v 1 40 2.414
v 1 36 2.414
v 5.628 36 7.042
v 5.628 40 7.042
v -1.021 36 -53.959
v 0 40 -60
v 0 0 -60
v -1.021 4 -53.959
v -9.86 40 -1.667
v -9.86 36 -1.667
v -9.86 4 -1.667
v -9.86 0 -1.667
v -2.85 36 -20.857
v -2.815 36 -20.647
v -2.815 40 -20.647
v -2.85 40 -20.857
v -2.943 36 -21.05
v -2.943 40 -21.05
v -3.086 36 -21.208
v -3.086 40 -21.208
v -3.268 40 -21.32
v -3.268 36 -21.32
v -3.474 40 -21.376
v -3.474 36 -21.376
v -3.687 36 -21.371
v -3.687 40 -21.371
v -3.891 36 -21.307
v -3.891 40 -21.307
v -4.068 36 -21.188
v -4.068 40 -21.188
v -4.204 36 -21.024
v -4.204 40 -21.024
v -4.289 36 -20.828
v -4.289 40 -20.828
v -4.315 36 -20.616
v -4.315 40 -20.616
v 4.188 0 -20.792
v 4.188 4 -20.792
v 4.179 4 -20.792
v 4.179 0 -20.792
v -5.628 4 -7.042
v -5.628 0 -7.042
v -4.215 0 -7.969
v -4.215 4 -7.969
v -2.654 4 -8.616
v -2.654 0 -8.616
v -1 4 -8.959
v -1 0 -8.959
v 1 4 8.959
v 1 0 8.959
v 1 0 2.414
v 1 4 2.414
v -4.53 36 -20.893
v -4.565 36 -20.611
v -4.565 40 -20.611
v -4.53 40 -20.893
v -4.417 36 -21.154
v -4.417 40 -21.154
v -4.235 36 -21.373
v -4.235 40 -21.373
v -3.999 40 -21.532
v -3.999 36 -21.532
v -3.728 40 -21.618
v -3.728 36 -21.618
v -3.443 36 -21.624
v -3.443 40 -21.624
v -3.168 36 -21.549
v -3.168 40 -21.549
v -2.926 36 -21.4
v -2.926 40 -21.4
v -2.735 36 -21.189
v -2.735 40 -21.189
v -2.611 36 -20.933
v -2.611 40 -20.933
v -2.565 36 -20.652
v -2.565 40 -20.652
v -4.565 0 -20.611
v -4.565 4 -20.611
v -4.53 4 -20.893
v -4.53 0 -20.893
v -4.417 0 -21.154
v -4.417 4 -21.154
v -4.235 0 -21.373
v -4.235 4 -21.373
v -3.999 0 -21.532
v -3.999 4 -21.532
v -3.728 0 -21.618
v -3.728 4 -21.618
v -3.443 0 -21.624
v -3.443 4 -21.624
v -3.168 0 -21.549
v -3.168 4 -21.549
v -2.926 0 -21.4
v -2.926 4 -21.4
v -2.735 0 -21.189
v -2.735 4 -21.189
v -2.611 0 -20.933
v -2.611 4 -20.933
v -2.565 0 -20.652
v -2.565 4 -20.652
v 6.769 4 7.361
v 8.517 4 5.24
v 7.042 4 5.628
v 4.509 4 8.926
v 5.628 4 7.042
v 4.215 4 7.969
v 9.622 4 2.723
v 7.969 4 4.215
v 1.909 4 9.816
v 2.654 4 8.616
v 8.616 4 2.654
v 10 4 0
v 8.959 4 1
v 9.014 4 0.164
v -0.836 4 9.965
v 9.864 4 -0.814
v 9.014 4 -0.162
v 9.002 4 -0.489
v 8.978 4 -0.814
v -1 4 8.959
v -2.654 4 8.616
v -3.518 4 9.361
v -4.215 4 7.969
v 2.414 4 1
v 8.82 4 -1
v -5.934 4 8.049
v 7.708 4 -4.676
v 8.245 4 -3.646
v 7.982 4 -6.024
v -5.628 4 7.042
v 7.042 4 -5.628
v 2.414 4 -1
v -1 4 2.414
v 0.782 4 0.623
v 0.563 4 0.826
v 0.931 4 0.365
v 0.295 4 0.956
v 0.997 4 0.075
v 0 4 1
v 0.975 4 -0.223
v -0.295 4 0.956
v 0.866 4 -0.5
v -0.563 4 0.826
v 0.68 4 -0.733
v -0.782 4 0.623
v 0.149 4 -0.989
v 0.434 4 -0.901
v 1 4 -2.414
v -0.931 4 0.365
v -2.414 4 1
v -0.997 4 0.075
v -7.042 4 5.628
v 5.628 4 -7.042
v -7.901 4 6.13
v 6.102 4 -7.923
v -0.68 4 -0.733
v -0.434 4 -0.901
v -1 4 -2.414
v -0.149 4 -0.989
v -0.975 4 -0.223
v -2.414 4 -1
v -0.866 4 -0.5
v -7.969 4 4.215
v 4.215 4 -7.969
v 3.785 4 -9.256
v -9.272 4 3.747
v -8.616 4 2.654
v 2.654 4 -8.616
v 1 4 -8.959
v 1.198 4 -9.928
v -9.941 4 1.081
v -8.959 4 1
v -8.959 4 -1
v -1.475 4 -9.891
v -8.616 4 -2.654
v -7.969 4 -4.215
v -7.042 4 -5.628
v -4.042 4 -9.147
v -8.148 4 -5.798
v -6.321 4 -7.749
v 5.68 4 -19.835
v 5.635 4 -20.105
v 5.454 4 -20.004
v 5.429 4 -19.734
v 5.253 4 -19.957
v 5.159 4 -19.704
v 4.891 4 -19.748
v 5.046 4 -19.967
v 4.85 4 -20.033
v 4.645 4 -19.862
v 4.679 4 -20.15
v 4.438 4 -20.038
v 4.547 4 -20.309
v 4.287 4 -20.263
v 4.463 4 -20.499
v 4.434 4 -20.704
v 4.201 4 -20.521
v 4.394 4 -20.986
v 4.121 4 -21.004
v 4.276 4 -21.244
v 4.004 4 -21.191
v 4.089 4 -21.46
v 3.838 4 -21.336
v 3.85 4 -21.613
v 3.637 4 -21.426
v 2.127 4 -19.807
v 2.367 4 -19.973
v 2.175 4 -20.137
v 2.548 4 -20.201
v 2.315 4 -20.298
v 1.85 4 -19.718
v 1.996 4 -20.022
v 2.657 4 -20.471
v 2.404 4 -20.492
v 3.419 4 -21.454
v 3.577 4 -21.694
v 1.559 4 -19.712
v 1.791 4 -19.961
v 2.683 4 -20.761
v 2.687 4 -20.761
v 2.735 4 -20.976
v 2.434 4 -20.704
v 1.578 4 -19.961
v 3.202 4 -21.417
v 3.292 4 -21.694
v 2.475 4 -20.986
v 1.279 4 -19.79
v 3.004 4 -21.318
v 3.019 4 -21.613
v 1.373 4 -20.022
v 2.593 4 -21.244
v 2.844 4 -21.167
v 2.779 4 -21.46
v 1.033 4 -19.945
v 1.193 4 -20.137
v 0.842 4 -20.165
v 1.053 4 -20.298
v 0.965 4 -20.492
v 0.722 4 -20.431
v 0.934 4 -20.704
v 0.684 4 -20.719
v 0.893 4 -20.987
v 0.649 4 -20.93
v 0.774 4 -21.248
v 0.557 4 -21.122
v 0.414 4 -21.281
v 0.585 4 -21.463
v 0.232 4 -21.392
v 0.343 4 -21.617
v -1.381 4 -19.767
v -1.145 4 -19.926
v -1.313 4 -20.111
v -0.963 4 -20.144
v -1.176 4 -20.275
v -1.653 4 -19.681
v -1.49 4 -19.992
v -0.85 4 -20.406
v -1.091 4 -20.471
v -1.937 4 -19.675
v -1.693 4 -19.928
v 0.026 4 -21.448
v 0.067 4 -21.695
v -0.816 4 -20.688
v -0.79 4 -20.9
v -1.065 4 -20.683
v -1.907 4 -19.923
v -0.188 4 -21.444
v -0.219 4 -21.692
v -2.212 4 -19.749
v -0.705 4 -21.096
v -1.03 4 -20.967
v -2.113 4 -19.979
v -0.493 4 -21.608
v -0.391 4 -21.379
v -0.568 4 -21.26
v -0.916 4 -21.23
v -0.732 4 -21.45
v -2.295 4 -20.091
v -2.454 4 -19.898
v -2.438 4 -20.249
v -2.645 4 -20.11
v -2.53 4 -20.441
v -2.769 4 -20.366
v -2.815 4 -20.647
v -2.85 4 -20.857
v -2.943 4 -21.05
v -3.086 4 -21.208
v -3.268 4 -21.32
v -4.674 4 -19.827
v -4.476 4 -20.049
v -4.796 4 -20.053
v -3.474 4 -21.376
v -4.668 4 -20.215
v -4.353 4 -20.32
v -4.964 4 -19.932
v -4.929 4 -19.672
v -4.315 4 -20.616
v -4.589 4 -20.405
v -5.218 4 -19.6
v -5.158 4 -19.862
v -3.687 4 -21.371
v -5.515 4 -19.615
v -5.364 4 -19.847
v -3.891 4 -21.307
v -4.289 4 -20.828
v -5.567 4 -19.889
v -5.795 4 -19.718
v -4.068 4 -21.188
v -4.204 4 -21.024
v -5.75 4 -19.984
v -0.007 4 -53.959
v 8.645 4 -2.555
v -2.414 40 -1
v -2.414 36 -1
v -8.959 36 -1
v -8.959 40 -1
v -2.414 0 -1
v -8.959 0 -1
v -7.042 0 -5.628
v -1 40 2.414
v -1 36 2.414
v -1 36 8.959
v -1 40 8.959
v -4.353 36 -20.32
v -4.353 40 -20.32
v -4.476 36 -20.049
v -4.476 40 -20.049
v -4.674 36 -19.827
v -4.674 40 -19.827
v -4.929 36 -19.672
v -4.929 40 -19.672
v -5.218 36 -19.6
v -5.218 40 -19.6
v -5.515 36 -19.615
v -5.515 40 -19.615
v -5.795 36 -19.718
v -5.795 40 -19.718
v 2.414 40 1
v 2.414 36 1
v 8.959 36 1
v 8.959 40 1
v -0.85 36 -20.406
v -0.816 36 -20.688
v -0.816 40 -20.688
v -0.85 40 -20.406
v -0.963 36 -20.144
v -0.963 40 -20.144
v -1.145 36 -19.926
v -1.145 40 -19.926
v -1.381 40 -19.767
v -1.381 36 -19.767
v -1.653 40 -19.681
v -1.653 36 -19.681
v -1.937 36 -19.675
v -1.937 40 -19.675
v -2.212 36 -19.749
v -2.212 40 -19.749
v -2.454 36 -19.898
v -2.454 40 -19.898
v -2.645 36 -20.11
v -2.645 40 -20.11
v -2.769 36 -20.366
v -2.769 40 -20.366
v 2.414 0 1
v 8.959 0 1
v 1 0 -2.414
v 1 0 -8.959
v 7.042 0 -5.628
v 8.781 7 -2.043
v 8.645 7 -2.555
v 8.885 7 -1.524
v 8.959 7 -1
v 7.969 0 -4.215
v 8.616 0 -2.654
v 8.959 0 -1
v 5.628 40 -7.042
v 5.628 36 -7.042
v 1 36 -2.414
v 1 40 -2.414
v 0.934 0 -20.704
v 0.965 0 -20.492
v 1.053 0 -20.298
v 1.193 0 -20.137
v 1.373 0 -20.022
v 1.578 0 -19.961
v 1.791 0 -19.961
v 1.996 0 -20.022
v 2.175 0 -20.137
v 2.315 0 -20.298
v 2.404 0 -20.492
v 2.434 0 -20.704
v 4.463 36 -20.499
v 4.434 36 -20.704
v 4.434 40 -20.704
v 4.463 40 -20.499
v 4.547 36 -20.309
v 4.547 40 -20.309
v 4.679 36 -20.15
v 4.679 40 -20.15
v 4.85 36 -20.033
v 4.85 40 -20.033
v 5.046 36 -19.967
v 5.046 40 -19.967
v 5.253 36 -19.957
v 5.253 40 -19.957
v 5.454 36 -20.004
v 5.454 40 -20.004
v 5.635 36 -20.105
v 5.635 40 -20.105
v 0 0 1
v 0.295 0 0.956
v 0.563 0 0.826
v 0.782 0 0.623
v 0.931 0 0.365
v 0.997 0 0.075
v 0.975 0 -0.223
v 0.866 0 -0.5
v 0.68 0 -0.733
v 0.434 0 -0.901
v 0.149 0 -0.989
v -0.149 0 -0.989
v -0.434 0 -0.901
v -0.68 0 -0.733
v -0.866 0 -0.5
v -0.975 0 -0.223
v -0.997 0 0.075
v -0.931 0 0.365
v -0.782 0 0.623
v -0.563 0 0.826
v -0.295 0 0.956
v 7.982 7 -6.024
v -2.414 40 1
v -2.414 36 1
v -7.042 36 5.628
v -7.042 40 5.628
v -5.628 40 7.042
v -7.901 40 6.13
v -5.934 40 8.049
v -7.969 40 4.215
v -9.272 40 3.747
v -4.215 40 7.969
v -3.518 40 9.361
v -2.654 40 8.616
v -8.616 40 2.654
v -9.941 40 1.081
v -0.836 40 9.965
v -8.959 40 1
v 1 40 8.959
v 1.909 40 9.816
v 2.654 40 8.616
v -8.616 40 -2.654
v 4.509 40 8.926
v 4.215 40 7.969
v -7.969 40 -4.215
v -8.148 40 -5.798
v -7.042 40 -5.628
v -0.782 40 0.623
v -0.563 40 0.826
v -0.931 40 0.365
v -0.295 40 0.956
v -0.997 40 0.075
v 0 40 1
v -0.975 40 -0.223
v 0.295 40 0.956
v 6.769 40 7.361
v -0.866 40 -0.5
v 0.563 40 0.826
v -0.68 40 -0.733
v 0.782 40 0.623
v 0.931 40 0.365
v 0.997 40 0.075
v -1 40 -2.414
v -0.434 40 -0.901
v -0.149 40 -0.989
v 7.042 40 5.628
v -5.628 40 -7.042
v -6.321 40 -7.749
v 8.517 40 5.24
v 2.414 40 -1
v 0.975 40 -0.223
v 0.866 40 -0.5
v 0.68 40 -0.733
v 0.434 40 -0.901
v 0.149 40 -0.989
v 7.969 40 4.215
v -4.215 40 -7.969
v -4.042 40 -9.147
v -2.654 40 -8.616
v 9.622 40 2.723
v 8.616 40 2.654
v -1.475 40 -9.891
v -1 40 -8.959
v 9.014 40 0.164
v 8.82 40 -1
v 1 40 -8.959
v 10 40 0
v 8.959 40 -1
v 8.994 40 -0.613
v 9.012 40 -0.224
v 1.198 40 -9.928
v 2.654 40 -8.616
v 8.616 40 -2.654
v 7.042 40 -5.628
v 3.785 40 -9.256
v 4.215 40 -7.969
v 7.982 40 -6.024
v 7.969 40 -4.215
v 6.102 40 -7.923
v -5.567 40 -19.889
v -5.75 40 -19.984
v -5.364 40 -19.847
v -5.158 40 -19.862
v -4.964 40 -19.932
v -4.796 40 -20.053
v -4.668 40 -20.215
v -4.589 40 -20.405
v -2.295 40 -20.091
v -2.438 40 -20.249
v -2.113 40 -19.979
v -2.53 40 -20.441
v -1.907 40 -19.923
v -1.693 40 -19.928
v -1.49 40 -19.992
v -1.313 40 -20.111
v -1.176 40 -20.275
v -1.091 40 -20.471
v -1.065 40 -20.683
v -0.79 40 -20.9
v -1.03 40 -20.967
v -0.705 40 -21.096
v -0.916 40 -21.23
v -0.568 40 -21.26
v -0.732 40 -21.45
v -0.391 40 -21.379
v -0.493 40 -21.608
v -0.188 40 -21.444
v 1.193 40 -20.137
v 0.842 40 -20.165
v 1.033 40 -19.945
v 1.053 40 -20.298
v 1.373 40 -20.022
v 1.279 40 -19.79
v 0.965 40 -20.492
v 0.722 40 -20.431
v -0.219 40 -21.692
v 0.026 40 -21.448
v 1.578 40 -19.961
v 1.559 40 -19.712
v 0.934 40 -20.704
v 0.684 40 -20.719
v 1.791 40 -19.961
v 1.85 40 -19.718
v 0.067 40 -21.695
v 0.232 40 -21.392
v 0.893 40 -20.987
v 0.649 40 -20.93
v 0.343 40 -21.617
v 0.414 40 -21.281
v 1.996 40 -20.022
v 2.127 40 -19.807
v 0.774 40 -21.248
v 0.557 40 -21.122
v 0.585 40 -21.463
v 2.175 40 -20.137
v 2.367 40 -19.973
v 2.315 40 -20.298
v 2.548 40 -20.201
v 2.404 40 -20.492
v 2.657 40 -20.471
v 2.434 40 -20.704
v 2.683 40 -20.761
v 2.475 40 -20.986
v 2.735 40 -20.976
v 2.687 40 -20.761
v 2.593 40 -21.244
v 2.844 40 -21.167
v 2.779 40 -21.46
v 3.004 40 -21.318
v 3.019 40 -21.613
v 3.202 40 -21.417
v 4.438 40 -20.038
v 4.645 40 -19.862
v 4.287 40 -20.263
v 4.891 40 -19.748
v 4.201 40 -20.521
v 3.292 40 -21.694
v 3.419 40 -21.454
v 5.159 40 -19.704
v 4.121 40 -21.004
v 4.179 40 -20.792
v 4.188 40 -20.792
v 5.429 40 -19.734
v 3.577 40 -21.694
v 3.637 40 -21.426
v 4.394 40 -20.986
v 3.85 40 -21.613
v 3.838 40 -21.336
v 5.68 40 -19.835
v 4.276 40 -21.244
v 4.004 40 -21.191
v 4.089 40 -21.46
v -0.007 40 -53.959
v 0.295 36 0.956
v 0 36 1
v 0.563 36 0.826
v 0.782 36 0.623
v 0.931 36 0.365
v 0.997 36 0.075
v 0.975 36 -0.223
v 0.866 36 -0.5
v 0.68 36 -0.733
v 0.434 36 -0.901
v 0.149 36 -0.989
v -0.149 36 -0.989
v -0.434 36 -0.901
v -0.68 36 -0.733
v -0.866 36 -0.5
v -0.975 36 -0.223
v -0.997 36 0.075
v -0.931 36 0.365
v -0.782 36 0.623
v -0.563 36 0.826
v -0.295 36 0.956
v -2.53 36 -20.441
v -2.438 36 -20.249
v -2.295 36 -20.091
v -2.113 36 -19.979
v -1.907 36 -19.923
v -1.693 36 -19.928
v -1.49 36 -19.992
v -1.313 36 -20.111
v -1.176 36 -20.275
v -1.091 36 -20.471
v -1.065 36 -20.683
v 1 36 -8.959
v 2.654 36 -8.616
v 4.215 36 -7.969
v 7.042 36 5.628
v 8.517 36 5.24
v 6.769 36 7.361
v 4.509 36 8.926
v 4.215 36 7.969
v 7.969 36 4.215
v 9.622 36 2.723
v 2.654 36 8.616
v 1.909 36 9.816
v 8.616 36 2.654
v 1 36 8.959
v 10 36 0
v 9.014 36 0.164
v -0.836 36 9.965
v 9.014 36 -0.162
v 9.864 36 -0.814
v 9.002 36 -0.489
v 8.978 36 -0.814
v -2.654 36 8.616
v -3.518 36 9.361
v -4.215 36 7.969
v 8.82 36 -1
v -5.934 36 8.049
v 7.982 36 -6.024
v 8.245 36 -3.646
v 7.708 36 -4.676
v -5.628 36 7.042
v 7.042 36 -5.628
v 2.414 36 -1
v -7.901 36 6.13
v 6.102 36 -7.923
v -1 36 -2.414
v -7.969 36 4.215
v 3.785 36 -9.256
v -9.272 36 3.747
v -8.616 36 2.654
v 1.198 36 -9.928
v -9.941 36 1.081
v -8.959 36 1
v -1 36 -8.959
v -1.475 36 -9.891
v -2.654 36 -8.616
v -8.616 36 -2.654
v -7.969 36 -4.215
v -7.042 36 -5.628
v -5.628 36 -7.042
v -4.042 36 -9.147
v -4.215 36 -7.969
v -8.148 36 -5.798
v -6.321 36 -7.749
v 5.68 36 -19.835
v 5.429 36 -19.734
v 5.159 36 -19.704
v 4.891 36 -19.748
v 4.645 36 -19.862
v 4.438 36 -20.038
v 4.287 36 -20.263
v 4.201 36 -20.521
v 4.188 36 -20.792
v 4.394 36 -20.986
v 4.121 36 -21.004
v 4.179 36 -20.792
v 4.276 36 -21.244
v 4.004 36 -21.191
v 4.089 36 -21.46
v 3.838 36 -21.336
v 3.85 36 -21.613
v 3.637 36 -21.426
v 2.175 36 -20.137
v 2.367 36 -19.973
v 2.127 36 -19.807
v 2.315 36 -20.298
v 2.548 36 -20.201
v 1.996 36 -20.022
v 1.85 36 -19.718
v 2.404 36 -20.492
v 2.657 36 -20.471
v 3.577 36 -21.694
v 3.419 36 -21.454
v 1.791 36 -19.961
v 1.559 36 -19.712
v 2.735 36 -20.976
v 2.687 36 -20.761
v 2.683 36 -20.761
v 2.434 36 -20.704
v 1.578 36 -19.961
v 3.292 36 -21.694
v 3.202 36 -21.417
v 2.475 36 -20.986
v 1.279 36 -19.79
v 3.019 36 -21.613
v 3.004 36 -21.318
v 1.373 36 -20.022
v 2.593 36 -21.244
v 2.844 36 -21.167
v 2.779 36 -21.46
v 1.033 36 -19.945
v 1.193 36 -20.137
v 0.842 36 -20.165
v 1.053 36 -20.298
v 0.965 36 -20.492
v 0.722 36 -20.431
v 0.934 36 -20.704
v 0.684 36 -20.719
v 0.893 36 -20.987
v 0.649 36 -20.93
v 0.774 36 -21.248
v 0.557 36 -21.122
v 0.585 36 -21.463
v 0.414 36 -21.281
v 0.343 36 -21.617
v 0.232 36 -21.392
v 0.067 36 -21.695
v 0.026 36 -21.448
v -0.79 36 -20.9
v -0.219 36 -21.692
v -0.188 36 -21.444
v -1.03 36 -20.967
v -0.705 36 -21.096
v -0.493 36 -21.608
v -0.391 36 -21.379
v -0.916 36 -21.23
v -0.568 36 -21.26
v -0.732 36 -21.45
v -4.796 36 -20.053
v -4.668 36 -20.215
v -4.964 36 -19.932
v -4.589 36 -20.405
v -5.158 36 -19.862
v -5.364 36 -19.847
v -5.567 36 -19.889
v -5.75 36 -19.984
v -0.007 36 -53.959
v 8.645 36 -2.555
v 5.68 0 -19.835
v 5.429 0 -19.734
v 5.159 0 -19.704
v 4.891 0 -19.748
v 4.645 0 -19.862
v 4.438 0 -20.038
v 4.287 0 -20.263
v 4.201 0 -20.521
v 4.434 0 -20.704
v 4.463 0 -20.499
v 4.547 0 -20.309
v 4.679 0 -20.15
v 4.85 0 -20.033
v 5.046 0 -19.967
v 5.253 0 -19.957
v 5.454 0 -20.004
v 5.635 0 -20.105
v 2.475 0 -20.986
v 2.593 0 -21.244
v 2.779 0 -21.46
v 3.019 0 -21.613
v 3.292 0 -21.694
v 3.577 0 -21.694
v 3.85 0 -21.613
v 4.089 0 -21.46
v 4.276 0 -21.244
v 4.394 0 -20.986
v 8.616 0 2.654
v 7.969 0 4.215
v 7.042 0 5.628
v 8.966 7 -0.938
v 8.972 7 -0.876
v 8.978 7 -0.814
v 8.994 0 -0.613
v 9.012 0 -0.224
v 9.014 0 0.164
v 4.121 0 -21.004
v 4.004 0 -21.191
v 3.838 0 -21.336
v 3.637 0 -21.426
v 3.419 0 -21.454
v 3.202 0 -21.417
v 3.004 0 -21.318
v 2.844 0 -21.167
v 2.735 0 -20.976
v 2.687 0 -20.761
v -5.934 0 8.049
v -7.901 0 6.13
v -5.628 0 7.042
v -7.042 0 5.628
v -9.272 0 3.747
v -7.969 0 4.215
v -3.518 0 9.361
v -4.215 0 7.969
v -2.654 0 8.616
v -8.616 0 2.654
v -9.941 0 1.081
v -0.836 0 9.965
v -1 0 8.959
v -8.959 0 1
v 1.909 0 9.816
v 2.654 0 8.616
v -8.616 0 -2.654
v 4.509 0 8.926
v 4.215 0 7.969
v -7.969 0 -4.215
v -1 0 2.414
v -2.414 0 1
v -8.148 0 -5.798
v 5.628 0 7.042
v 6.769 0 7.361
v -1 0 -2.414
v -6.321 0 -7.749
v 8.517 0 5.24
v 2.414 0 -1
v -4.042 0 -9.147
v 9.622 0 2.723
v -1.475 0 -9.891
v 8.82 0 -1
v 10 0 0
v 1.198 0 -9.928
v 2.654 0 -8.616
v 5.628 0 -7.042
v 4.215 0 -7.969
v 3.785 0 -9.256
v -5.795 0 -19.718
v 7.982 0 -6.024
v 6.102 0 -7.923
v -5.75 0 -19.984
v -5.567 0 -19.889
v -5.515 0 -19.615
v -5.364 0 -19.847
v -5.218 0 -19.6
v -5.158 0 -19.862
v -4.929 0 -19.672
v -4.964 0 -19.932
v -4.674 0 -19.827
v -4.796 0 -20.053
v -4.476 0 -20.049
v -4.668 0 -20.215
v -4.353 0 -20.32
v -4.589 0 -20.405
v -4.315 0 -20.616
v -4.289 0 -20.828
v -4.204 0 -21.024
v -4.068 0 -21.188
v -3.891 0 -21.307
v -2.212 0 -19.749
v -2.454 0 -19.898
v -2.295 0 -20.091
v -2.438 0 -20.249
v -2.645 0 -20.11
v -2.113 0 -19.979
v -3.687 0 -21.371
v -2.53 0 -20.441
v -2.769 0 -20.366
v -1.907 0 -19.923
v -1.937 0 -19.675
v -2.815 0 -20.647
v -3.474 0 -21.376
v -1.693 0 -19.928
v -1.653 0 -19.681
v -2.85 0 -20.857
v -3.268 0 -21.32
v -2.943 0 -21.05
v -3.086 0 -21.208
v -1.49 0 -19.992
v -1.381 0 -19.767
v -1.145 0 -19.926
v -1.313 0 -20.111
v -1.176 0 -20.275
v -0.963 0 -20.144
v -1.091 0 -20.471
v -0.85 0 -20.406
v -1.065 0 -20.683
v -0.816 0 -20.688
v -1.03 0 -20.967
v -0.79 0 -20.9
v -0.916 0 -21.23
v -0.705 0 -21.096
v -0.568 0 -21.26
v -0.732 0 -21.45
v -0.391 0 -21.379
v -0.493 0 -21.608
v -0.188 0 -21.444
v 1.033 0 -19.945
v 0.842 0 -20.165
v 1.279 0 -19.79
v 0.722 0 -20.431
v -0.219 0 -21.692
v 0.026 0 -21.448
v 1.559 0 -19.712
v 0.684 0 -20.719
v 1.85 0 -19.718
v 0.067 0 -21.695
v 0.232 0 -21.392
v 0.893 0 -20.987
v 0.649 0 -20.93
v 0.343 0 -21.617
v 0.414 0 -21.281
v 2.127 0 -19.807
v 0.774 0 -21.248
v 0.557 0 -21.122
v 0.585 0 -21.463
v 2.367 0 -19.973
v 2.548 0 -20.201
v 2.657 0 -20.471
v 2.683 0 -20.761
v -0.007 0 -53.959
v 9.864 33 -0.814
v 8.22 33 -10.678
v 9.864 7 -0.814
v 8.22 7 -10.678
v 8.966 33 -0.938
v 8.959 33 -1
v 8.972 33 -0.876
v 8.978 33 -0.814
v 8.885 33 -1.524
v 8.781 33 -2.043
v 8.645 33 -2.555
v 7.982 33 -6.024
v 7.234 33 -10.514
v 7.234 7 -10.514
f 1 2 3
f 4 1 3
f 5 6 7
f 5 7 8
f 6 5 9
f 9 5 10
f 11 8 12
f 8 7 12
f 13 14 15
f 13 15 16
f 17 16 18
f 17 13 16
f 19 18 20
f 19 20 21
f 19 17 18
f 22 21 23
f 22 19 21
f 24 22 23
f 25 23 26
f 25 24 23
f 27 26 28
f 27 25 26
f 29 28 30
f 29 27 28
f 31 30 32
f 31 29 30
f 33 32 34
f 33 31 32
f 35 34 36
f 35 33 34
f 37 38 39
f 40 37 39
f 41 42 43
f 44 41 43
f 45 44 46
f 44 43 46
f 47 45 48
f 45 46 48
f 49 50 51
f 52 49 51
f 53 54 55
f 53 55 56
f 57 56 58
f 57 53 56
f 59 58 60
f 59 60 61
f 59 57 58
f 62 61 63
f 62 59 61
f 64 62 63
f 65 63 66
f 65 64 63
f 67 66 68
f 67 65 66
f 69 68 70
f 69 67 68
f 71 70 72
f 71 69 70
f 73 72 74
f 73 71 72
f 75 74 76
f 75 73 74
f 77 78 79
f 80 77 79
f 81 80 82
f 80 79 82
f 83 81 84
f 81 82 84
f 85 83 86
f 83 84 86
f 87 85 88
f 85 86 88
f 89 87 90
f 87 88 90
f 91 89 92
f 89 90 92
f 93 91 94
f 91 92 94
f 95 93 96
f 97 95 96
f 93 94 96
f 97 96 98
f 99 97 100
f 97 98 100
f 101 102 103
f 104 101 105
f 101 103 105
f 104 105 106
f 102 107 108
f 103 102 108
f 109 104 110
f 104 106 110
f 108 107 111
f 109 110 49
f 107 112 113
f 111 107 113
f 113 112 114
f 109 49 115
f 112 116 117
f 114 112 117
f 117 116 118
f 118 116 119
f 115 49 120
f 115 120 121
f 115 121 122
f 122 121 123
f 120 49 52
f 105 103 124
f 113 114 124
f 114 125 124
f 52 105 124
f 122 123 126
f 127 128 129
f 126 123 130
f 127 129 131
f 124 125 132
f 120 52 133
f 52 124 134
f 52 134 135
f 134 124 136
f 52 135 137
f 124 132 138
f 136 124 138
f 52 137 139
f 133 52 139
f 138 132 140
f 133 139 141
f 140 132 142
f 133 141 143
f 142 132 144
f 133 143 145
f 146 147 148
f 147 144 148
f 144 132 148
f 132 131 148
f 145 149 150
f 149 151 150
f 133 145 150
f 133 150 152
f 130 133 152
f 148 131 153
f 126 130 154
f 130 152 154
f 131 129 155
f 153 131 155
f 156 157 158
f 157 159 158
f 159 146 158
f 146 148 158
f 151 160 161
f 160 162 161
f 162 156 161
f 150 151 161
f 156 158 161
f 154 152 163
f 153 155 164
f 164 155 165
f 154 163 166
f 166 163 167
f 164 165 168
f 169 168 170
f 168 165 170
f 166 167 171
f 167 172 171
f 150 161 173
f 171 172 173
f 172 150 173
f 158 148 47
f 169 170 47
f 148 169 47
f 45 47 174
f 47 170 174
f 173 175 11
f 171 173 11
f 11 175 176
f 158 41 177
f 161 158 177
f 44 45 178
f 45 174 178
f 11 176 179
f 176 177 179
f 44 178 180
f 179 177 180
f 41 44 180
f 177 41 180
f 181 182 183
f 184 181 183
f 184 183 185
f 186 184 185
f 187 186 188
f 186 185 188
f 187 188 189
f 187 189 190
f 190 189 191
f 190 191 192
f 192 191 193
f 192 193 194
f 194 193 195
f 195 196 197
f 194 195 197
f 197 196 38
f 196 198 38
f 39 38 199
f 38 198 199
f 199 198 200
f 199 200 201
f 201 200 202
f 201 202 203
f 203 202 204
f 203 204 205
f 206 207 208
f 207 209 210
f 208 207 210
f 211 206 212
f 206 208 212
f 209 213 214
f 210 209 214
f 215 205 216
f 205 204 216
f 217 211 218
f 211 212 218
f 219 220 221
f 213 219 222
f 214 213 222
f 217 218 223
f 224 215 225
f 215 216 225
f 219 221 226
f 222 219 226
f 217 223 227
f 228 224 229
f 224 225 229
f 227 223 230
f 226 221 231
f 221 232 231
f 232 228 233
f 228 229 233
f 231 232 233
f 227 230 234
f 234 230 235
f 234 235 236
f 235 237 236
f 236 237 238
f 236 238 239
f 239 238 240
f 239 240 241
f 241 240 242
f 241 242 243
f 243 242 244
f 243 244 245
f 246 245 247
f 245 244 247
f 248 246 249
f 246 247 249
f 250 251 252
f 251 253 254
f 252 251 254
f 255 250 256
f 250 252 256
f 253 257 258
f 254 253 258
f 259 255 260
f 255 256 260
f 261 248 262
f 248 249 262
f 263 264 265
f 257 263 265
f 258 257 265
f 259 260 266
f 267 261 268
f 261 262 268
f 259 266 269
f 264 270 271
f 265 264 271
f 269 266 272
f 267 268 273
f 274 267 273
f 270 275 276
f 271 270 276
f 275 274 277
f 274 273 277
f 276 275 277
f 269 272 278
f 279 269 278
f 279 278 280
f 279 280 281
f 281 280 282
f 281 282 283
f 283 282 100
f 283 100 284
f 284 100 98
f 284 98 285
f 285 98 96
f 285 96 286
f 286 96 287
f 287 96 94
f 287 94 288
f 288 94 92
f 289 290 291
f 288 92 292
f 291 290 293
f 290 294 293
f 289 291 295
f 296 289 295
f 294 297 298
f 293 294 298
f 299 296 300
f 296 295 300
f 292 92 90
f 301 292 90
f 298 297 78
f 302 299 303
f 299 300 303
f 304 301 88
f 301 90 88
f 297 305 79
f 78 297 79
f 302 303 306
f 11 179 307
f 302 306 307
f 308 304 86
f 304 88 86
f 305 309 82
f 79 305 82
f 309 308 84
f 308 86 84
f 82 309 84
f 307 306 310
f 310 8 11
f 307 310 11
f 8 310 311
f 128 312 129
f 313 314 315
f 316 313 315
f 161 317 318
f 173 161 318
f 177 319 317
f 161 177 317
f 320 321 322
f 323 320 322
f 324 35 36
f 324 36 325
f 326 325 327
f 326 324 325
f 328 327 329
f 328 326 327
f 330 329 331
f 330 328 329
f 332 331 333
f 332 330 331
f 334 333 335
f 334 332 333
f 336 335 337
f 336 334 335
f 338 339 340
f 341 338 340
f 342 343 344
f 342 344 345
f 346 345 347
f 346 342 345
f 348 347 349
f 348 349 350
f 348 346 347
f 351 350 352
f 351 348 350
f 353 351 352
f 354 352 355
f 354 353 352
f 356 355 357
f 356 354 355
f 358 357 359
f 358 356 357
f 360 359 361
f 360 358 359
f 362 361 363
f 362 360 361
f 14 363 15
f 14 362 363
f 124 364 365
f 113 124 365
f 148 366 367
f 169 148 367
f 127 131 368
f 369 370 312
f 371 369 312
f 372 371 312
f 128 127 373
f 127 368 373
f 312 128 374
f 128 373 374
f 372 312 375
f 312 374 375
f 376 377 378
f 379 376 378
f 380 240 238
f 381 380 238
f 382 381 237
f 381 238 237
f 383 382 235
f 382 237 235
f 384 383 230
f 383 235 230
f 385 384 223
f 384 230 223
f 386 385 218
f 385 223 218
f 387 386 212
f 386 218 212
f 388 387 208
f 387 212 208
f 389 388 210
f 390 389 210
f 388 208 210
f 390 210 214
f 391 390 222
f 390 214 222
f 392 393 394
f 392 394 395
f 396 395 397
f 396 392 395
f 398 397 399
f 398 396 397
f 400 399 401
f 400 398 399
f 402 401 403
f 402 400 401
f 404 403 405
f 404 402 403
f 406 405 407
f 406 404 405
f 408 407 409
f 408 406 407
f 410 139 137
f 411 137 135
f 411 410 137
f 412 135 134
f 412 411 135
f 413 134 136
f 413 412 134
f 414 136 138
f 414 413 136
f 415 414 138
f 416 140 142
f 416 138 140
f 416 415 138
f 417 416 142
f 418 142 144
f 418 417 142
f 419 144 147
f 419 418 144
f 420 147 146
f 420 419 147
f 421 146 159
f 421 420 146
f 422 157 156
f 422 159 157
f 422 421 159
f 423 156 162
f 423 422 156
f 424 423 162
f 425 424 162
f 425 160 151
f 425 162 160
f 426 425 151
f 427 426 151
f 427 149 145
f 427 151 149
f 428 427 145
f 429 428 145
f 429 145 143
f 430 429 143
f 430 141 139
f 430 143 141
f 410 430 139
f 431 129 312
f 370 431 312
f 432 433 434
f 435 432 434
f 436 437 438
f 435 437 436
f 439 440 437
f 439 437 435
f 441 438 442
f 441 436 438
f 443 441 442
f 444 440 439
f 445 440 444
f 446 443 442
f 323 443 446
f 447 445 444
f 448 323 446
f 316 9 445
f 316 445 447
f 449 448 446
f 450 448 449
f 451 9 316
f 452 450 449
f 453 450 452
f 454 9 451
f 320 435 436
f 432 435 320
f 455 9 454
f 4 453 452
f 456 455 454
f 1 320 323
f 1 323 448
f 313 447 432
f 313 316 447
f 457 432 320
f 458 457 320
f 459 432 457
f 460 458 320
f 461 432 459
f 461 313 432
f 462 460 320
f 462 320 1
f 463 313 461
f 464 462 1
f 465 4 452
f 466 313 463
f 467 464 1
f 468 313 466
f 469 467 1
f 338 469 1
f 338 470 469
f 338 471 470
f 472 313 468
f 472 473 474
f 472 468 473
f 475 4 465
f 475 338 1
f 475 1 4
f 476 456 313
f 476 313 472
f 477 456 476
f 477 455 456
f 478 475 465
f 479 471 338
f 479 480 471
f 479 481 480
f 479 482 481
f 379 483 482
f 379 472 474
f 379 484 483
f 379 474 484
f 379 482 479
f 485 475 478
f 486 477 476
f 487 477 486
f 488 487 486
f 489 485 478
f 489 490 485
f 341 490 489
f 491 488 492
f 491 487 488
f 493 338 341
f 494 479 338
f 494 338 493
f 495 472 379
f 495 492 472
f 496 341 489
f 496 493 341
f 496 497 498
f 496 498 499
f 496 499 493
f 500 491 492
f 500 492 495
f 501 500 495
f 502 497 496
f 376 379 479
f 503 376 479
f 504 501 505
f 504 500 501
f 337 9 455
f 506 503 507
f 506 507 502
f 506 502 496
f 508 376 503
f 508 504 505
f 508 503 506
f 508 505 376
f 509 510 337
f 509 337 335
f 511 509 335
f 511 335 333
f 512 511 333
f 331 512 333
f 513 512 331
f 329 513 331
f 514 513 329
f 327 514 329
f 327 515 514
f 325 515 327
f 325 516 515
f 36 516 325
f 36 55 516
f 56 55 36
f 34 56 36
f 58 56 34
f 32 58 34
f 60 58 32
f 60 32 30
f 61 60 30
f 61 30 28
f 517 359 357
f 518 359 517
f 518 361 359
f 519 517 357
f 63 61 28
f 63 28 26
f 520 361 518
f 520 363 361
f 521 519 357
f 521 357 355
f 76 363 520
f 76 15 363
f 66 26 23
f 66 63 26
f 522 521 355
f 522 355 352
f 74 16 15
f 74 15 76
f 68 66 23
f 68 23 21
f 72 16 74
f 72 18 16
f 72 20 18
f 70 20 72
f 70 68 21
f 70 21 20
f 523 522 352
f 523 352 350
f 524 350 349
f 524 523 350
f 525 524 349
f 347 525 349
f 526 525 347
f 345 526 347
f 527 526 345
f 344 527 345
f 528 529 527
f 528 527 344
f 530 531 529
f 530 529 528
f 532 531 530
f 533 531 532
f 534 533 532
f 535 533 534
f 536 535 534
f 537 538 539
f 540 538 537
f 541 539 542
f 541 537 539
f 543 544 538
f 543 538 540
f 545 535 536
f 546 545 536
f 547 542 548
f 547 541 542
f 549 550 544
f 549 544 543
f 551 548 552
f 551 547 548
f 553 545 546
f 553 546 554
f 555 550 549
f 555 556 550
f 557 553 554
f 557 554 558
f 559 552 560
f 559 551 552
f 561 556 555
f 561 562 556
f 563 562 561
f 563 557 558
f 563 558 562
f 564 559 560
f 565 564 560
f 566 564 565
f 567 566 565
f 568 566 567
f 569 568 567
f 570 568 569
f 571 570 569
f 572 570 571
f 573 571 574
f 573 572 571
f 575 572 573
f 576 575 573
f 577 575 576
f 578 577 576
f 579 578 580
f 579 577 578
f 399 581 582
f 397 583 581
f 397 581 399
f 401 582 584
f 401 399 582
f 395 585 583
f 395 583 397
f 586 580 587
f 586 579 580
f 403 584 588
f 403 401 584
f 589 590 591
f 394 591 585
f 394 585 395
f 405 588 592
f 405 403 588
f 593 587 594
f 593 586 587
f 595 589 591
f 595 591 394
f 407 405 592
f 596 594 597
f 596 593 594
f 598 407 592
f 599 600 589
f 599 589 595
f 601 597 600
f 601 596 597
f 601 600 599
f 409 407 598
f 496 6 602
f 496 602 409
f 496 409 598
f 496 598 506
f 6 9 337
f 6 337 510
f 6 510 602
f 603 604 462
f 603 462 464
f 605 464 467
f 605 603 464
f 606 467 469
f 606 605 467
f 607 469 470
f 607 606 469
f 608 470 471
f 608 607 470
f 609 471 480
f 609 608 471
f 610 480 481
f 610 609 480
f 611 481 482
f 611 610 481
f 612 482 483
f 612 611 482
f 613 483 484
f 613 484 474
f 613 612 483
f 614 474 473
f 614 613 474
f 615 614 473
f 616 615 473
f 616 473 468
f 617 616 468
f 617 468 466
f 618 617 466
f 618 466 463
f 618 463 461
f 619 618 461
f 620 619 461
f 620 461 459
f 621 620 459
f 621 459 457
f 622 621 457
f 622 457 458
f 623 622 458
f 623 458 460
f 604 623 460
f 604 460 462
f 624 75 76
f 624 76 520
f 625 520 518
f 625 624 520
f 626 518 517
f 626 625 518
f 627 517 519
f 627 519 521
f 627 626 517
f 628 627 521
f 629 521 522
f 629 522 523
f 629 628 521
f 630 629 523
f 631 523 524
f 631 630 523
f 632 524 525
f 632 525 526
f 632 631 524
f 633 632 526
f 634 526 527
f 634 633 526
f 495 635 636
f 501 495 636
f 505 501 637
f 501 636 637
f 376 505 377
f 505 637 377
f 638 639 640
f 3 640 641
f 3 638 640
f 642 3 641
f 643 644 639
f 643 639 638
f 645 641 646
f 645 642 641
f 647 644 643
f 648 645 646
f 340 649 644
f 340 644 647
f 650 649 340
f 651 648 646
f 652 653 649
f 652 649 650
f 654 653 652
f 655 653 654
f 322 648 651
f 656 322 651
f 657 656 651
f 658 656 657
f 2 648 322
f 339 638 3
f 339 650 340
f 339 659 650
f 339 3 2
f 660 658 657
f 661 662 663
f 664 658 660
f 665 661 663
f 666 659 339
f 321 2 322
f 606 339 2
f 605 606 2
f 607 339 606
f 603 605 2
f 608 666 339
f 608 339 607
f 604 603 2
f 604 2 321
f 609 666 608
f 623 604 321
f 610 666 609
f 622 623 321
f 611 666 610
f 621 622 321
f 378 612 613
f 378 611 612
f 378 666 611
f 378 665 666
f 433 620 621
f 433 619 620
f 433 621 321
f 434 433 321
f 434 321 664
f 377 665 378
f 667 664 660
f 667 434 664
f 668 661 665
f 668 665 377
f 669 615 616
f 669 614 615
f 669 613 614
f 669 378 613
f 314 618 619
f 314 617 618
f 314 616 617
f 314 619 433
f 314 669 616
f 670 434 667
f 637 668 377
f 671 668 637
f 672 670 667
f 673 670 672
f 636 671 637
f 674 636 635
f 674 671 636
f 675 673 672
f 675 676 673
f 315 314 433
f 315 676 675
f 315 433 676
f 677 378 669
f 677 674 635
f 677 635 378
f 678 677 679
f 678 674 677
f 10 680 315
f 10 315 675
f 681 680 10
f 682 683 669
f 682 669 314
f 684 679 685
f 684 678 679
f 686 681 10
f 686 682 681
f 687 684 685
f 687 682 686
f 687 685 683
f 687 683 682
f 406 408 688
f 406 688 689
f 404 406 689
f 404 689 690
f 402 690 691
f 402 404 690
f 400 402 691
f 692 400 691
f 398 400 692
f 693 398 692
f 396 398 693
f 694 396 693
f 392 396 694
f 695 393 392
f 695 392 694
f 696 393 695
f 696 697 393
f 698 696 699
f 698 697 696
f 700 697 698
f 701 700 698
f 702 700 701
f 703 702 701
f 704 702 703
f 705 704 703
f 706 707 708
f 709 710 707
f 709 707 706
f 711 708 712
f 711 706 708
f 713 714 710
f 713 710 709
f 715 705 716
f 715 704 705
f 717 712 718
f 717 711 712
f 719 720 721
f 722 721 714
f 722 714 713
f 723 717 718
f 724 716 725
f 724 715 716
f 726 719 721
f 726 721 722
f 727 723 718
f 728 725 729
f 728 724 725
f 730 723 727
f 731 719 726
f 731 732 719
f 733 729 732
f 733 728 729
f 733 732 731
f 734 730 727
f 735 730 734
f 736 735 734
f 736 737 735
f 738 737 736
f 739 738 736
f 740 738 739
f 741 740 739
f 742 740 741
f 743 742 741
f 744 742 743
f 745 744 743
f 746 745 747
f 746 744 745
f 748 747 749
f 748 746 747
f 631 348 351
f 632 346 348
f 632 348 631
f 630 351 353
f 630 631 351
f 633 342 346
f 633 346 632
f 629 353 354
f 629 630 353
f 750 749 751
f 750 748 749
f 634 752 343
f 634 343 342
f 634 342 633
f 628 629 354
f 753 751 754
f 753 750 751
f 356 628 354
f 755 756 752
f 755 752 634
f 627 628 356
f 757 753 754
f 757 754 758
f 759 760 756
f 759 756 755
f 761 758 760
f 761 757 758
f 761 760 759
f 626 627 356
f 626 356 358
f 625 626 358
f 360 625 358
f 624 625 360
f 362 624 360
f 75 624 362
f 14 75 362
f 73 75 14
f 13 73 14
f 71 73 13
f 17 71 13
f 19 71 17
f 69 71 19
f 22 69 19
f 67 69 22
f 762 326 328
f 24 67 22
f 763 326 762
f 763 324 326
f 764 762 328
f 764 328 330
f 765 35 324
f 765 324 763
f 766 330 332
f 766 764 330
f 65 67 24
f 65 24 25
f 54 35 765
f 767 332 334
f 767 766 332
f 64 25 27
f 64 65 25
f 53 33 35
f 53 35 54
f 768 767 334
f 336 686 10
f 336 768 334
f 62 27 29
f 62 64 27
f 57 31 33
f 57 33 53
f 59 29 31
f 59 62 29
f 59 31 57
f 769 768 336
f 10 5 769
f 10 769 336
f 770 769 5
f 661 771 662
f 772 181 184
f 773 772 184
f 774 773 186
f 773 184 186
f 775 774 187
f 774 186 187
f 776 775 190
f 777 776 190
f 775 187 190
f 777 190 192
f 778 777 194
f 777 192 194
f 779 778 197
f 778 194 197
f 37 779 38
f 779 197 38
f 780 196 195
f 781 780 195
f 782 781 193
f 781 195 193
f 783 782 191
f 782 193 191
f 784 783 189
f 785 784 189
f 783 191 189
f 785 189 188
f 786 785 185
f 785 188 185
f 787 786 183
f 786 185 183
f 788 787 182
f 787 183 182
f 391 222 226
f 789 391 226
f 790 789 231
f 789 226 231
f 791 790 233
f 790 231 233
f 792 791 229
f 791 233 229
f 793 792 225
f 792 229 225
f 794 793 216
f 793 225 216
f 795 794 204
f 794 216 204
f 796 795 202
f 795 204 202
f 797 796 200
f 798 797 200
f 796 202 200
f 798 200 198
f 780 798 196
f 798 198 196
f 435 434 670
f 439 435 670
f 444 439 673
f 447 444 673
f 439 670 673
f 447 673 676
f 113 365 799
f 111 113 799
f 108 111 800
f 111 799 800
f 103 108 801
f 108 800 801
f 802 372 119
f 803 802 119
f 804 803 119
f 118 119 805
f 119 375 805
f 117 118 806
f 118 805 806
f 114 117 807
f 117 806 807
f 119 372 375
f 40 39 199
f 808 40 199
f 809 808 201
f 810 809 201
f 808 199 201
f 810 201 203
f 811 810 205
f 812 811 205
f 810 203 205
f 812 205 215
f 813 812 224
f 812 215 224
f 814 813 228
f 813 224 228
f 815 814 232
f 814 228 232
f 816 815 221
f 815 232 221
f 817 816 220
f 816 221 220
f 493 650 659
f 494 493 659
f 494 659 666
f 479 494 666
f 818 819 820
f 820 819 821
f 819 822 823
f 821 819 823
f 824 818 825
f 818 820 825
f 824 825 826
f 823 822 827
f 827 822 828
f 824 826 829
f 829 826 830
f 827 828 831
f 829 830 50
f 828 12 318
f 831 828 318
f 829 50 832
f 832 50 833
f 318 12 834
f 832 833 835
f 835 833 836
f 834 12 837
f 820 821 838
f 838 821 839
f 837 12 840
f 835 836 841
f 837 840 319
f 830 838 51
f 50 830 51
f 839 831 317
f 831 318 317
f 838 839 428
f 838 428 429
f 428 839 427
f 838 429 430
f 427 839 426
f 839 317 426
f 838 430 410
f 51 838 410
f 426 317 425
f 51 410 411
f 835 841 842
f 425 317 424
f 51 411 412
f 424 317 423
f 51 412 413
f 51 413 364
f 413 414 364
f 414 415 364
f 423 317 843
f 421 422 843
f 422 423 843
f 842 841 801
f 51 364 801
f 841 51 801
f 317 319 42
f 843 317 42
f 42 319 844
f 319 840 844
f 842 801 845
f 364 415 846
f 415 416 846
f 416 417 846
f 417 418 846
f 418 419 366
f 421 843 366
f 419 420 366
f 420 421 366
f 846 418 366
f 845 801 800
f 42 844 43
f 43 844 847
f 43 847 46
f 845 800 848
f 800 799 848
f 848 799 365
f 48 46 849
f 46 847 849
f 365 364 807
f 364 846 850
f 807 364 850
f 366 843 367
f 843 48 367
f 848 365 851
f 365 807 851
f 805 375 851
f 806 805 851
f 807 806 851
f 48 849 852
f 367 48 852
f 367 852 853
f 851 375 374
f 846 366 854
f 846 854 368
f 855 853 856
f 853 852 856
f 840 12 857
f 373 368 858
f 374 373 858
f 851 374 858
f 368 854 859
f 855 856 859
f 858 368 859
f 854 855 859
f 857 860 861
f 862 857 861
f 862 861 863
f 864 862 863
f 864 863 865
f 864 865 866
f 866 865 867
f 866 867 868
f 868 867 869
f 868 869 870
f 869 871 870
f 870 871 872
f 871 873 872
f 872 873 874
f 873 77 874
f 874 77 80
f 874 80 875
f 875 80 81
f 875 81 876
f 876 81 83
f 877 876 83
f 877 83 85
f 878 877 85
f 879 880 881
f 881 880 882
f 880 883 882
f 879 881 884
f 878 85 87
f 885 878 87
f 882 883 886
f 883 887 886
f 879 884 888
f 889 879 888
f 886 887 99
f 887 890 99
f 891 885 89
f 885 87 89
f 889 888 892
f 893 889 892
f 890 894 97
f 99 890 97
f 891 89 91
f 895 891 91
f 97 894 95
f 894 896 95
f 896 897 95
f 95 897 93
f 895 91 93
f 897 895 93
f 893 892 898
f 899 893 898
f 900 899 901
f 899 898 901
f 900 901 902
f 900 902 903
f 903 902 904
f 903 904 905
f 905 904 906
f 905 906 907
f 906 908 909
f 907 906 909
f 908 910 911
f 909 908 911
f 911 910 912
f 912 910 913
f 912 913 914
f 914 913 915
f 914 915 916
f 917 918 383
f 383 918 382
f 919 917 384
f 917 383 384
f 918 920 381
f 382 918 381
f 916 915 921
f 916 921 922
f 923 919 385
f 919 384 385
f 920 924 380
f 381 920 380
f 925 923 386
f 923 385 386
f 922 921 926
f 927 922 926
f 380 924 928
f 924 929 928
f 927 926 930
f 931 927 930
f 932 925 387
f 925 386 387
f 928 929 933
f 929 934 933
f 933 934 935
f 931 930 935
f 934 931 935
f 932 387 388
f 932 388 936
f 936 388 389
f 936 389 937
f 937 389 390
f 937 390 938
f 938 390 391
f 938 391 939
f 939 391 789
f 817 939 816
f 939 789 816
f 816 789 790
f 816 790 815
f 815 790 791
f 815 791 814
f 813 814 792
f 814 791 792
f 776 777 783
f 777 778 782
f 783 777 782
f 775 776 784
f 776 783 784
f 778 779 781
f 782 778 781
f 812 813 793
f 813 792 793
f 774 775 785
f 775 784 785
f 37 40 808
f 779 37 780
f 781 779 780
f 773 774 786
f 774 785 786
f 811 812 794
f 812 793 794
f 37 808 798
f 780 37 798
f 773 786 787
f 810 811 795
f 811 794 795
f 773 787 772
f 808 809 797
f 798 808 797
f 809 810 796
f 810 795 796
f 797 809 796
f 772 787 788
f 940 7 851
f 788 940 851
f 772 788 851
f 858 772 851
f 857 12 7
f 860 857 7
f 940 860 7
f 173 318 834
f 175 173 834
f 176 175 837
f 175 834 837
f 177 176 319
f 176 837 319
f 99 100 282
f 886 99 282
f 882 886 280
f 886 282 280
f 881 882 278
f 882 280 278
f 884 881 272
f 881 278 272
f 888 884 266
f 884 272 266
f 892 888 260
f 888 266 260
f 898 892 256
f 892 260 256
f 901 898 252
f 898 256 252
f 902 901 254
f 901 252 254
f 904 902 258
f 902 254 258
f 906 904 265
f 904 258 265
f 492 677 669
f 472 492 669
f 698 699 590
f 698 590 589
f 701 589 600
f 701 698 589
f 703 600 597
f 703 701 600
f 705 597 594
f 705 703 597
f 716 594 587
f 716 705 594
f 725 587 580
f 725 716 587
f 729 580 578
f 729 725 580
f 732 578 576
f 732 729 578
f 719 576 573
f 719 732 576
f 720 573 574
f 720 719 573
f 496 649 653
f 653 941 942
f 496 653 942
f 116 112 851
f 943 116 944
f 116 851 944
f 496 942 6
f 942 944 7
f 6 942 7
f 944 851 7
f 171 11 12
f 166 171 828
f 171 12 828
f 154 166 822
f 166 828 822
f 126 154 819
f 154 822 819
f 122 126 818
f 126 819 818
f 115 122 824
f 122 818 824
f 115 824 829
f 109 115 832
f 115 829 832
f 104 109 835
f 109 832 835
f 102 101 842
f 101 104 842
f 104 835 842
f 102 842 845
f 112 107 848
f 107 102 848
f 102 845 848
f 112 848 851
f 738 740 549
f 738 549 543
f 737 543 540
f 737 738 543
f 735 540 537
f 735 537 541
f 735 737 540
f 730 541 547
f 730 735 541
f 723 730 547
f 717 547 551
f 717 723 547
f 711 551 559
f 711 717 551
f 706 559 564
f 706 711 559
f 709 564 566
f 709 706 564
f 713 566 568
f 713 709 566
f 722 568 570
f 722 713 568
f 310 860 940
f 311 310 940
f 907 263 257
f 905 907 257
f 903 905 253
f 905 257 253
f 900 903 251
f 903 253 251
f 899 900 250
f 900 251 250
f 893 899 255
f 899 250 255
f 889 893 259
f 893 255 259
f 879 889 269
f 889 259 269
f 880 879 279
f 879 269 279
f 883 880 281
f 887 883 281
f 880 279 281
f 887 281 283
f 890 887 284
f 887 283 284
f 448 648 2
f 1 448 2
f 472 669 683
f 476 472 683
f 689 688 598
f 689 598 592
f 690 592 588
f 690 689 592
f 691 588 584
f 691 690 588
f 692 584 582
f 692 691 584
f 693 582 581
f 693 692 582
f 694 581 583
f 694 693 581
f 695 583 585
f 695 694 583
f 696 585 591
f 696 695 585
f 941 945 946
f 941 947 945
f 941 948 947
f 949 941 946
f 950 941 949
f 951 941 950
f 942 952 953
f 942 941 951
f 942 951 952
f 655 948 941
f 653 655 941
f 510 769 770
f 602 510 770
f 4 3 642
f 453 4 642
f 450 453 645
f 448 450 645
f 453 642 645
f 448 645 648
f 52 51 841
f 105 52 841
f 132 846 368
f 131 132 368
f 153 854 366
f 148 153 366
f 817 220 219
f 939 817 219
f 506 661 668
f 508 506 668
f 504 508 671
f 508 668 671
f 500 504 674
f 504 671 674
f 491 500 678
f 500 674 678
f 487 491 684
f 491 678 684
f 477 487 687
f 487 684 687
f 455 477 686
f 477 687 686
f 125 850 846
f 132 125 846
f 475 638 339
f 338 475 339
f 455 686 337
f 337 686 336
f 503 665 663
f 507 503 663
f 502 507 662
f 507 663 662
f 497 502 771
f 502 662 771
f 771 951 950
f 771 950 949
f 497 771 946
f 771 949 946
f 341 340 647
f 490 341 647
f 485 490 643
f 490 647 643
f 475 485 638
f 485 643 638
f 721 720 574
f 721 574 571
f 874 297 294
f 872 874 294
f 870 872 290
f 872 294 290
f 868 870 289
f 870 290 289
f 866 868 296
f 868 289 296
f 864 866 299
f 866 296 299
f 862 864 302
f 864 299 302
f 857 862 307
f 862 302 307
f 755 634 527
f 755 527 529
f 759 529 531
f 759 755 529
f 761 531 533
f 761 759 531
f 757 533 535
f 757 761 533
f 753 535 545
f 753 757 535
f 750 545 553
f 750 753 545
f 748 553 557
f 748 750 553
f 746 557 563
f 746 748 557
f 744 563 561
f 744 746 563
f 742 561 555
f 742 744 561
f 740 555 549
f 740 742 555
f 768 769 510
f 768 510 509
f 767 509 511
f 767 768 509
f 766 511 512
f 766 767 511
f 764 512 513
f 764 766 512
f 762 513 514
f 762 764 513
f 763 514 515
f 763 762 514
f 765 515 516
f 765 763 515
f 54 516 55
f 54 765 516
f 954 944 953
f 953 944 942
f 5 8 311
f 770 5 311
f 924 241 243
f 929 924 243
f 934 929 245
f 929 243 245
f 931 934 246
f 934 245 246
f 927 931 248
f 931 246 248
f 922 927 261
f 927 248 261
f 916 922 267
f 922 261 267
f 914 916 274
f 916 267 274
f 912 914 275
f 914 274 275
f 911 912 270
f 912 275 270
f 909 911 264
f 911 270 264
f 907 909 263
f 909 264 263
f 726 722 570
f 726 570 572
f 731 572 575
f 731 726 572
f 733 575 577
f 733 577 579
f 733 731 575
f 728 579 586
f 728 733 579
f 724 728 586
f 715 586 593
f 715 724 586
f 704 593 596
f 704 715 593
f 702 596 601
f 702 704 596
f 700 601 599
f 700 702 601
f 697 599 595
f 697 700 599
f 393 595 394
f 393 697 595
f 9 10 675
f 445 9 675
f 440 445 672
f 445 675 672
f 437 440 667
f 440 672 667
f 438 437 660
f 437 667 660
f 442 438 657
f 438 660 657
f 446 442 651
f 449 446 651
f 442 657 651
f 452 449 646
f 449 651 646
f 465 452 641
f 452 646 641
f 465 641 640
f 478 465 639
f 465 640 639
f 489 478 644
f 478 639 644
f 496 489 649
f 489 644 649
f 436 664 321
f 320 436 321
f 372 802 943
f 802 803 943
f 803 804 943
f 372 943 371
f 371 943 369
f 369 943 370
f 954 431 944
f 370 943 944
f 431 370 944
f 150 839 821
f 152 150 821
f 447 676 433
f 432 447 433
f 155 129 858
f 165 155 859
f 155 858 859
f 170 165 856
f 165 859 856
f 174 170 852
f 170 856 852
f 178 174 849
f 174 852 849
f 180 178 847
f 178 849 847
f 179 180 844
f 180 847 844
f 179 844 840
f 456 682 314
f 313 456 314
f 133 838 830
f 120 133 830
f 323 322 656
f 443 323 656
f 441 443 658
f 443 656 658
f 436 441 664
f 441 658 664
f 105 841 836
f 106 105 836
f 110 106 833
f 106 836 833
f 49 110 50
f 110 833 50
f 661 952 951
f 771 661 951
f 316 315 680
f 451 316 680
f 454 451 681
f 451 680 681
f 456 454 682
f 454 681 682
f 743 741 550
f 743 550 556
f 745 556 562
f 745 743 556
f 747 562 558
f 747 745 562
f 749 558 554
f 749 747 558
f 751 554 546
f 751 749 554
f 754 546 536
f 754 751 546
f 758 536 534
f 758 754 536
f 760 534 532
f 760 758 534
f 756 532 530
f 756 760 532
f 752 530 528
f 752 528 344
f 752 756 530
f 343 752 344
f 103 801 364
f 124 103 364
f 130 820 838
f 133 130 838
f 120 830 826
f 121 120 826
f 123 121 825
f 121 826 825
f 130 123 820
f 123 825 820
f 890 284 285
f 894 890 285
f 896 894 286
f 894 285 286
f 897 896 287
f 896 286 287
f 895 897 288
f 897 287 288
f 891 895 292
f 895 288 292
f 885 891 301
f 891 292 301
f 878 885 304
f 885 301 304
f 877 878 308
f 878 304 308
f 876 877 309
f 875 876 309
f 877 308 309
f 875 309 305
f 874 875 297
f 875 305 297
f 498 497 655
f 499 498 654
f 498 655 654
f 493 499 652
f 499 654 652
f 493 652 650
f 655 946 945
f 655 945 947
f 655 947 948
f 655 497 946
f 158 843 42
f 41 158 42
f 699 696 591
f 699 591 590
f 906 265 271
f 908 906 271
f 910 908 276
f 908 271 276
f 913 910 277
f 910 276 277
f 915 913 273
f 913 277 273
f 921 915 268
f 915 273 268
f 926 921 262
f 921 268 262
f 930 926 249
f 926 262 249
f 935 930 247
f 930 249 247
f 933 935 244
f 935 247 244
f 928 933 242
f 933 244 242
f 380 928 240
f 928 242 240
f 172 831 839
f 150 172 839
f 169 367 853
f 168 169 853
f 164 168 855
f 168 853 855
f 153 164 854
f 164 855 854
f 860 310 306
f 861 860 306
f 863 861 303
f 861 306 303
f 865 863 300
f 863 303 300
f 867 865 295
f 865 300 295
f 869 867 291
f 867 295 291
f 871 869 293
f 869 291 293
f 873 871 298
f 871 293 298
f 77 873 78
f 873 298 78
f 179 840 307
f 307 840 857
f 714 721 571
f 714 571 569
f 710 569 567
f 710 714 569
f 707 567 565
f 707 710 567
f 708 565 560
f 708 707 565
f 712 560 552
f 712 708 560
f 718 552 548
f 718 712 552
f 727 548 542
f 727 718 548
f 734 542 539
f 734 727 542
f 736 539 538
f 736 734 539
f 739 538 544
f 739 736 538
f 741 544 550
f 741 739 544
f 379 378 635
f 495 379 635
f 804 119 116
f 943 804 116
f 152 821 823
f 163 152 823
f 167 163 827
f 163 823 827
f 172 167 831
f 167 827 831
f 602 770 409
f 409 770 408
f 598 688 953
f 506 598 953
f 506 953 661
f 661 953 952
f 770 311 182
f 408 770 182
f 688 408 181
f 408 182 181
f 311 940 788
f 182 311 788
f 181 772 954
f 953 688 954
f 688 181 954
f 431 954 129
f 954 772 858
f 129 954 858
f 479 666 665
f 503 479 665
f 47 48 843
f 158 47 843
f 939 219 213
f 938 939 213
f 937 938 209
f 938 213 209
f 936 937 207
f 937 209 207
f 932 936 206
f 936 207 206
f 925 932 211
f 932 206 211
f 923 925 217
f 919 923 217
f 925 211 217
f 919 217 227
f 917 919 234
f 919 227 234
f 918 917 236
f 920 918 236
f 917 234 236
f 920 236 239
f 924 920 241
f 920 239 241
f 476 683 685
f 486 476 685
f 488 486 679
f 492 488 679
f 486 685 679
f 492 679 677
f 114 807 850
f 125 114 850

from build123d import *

# Parameters (mm, degrees)
SKETCH1_R           = 1
BOSS_EXTRUDE1_DEPTH = 40
CUT_EXTRUDE2_DEPTH  = 16
SKETCH5_W           = 10
SKETCH5_H           = 26
CUT_EXTRUDE3_DEPTH  = 12.75
BOSS_EXTRUDE2_DEPTH = 4


with BuildPart() as part:
    # Sketch1 → Boss-Extrude1 (new body)
    with BuildSketch(Plane(origin=(0, 0, 0), x_dir=(1, 0, 0), z_dir=(0, 1, 0))):
        with BuildLine():
            Line((10, 0), (0, 60))
            Line((0, 60), (-9.860132972, 1.666666667))
            ThreePointArc((-9.860132972, 1.666666667), (-0.836262603, -9.964971895), (10, 0))
        make_face()
        Circle(SKETCH1_R, mode=Mode.SUBTRACT)
        with BuildLine():
            Line((-1, 8.959471052), (-1, 2.414213562))
            Line((-1, 2.414213562), (-5.628195955, 7.042409518))
            ThreePointArc((-5.628195955, 7.042409518), (-3.449931396, 8.328871165), (-1, 8.959471052))
        make_face(mode=Mode.SUBTRACT)
        with BuildLine():
            Line((-7.042409518, 5.628195955), (-2.414213562, 1))
            Line((-2.414213562, 1), (-8.959471052, 1))
            ThreePointArc((-8.959471052, 1), (-8.328871165, 3.449931396), (-7.042409518, 5.628195955))
        make_face(mode=Mode.SUBTRACT)
        with BuildLine():
            Line((1, 2.414213562), (1, 8.959471052))
            ThreePointArc((1, 8.959471052), (3.449931396, 8.328871165), (5.628195955, 7.042409518))
            Line((5.628195955, 7.042409518), (1, 2.414213562))
        make_face(mode=Mode.SUBTRACT)
        with BuildLine():
            Line((-8.147636517, 5.797932319), (-0.006945449, 53.958910167))
            Line((-0.006945449, 53.958910167), (7.982280685, 6.023553358))
            ThreePointArc((7.982280685, 6.023553358), (-0.139863688, 9.99902186), (-8.147636517, 5.797932319))
        make_face(mode=Mode.SUBTRACT)
        with BuildLine():
            Line((2.414213562, 1), (7.042409518, 5.628195955))
            ThreePointArc((7.042409518, 5.628195955), (8.328871165, 3.449931396), (8.959471052, 1))
            ThreePointArc((8.959471052, 1), (9.005377927, 0.418676383), (9.013606076, -0.164398987))
            Line((9.013606076, -0.164398987), (8.819539578, 1))
            Line((8.819539578, 1), (2.414213562, 1))
        make_face(mode=Mode.SUBTRACT)
        with BuildLine():
            Line((-8.959471052, -1), (-2.414213562, -1))
            Line((-2.414213562, -1), (-7.042409518, -5.628195955))
            ThreePointArc((-7.042409518, -5.628195955), (-8.328871165, -3.449931396), (-8.959471052, -1))
        make_face(mode=Mode.SUBTRACT)
        with BuildLine():
            ThreePointArc((-1, -8.959471052), (-3.449931396, -8.328871165), (-5.628195955, -7.042409518))
            Line((-5.628195955, -7.042409518), (-1, -2.414213562))
            Line((-1, -2.414213562), (-1, -8.959471052))
        make_face(mode=Mode.SUBTRACT)
        with BuildLine():
            ThreePointArc((5.628195955, -7.042409518), (3.449931396, -8.328871165), (1, -8.959471052))
            Line((1, -8.959471052), (1, -2.414213562))
            Line((1, -2.414213562), (5.628195955, -7.042409518))
        make_face(mode=Mode.SUBTRACT)
        with BuildLine():
            ThreePointArc((8.959471052, -1), (8.328871165, -3.449931396), (7.042409518, -5.628195955))
            Line((7.042409518, -5.628195955), (2.414213562, -1))
            Line((2.414213562, -1), (8.959471052, -1))
        make_face(mode=Mode.SUBTRACT)
    extrude(amount=BOSS_EXTRUDE1_DEPTH)

    # Sketch4 → Cut-Extrude2 (cut, symmetric)
    with BuildSketch(Plane(origin=(0, 20, 0), x_dir=(-1, 0, 0), z_dir=(0, -1, 0))):
        Polygon((-8.877415303, 1.341770275), (-8.978243143, 0.814414874), (-12.501432649, 0.814414874), (-12.501432649, -9.874000046), (27.256185967, -11.315556265), (27.256185967, 53.958910167), (0.006945449, 53.958910167), (-7.982280685, 6.023553358), (-8.645423601, 2.555146235), (-8.746251441, 2.027790834), align=None)
    extrude(amount=CUT_EXTRUDE2_DEPTH, both=True, mode=Mode.SUBTRACT)

    # Sketch5 → Cut-Extrude3 (cut, symmetric)
    with BuildSketch(Plane(origin=(9.72972973, 0, -1.621621622), x_dir=(-0.1643989873053573, 0, -0.9863939238321439), z_dir=(0.9863939238321439, 0, -0.1643989873053573))):
        with Locations((4.181658841, 20)):
            Rectangle(SKETCH5_W, SKETCH5_H)
    extrude(amount=CUT_EXTRUDE3_DEPTH, both=True, mode=Mode.SUBTRACT)

    # Sketch6 → Boss-Extrude2 (add)
    with BuildSketch(Plane.XZ):
        with BuildLine():
            Line((-5.794737363, -19.717871437), (-5.749720089, -19.984197223))
            ThreePointArc((-5.749720089, -19.984197223), (-4.964059213, -19.93196472), (-4.56470455, -20.610571454))
            ThreePointArc((-4.56470455, -20.610571454), (-3.58563596, -21.631073632), (-2.565133782, -20.652005041))
            ThreePointArc((-2.565133782, -20.652005041), (-1.79975716, -19.917703584), (-1.065455705, -20.683080209))
            ThreePointArc((-1.065455705, -20.683080209), (-0.07602927, -21.703743341), (0.934329679, -20.703796997))
            ThreePointArc((0.934329679, -20.703796997), (1.684329679, -19.953796997), (2.434329679, -20.703796997))
            ThreePointArc((2.434329679, -20.703796997), (3.434329679, -21.703796997), (4.434329679, -20.703796997))
            ThreePointArc((4.434329679, -20.703796997), (4.849537937, -20.032667732), (5.635434984, -20.104627568))
            Line((5.635434984, -20.104627568), (5.680296948, -19.83545578))
            ThreePointArc((5.680296948, -19.83545578), (4.644652017, -19.86192526), (4.188222104, -20.791942891))
            Line((4.188222104, -20.791942891), (4.179154082, -20.79175499))
            ThreePointArc((4.179154082, -20.79175499), (3.41879209, -21.453636035), (2.68650098, -20.760825378))
            Line((2.68650098, -20.760825378), (2.682706725, -20.760746756))
            ThreePointArc((2.682706725, -20.760746756), (1.712816119, -19.704202818), (0.684329679, -20.703796997))
            ThreePointArc((0.684329679, -20.703796997), (-0.073439528, -21.453756755), (-0.815509359, -20.688259416))
            ThreePointArc((-0.815509359, -20.688259416), (-1.794577953, -19.667757238), (-2.815080128, -20.646825835))
            ThreePointArc((-2.815080128, -20.646825835), (-3.580456755, -21.381127286), (-4.314758204, -20.615750657))
            ThreePointArc((-4.314758204, -20.615750657), (-4.795852319, -19.740072256), (-5.794737363, -19.717871437))
        make_face()
    boss_extrude2 = extrude(amount=-BOSS_EXTRUDE2_DEPTH)

    # Mirror2: Boss-Extrude2 across plane
    add(boss_extrude2.mirror(Plane(origin=(0, 20, 0), x_dir=(0, 0, 1), z_dir=(0, -1, 0))))


solid = part.part
